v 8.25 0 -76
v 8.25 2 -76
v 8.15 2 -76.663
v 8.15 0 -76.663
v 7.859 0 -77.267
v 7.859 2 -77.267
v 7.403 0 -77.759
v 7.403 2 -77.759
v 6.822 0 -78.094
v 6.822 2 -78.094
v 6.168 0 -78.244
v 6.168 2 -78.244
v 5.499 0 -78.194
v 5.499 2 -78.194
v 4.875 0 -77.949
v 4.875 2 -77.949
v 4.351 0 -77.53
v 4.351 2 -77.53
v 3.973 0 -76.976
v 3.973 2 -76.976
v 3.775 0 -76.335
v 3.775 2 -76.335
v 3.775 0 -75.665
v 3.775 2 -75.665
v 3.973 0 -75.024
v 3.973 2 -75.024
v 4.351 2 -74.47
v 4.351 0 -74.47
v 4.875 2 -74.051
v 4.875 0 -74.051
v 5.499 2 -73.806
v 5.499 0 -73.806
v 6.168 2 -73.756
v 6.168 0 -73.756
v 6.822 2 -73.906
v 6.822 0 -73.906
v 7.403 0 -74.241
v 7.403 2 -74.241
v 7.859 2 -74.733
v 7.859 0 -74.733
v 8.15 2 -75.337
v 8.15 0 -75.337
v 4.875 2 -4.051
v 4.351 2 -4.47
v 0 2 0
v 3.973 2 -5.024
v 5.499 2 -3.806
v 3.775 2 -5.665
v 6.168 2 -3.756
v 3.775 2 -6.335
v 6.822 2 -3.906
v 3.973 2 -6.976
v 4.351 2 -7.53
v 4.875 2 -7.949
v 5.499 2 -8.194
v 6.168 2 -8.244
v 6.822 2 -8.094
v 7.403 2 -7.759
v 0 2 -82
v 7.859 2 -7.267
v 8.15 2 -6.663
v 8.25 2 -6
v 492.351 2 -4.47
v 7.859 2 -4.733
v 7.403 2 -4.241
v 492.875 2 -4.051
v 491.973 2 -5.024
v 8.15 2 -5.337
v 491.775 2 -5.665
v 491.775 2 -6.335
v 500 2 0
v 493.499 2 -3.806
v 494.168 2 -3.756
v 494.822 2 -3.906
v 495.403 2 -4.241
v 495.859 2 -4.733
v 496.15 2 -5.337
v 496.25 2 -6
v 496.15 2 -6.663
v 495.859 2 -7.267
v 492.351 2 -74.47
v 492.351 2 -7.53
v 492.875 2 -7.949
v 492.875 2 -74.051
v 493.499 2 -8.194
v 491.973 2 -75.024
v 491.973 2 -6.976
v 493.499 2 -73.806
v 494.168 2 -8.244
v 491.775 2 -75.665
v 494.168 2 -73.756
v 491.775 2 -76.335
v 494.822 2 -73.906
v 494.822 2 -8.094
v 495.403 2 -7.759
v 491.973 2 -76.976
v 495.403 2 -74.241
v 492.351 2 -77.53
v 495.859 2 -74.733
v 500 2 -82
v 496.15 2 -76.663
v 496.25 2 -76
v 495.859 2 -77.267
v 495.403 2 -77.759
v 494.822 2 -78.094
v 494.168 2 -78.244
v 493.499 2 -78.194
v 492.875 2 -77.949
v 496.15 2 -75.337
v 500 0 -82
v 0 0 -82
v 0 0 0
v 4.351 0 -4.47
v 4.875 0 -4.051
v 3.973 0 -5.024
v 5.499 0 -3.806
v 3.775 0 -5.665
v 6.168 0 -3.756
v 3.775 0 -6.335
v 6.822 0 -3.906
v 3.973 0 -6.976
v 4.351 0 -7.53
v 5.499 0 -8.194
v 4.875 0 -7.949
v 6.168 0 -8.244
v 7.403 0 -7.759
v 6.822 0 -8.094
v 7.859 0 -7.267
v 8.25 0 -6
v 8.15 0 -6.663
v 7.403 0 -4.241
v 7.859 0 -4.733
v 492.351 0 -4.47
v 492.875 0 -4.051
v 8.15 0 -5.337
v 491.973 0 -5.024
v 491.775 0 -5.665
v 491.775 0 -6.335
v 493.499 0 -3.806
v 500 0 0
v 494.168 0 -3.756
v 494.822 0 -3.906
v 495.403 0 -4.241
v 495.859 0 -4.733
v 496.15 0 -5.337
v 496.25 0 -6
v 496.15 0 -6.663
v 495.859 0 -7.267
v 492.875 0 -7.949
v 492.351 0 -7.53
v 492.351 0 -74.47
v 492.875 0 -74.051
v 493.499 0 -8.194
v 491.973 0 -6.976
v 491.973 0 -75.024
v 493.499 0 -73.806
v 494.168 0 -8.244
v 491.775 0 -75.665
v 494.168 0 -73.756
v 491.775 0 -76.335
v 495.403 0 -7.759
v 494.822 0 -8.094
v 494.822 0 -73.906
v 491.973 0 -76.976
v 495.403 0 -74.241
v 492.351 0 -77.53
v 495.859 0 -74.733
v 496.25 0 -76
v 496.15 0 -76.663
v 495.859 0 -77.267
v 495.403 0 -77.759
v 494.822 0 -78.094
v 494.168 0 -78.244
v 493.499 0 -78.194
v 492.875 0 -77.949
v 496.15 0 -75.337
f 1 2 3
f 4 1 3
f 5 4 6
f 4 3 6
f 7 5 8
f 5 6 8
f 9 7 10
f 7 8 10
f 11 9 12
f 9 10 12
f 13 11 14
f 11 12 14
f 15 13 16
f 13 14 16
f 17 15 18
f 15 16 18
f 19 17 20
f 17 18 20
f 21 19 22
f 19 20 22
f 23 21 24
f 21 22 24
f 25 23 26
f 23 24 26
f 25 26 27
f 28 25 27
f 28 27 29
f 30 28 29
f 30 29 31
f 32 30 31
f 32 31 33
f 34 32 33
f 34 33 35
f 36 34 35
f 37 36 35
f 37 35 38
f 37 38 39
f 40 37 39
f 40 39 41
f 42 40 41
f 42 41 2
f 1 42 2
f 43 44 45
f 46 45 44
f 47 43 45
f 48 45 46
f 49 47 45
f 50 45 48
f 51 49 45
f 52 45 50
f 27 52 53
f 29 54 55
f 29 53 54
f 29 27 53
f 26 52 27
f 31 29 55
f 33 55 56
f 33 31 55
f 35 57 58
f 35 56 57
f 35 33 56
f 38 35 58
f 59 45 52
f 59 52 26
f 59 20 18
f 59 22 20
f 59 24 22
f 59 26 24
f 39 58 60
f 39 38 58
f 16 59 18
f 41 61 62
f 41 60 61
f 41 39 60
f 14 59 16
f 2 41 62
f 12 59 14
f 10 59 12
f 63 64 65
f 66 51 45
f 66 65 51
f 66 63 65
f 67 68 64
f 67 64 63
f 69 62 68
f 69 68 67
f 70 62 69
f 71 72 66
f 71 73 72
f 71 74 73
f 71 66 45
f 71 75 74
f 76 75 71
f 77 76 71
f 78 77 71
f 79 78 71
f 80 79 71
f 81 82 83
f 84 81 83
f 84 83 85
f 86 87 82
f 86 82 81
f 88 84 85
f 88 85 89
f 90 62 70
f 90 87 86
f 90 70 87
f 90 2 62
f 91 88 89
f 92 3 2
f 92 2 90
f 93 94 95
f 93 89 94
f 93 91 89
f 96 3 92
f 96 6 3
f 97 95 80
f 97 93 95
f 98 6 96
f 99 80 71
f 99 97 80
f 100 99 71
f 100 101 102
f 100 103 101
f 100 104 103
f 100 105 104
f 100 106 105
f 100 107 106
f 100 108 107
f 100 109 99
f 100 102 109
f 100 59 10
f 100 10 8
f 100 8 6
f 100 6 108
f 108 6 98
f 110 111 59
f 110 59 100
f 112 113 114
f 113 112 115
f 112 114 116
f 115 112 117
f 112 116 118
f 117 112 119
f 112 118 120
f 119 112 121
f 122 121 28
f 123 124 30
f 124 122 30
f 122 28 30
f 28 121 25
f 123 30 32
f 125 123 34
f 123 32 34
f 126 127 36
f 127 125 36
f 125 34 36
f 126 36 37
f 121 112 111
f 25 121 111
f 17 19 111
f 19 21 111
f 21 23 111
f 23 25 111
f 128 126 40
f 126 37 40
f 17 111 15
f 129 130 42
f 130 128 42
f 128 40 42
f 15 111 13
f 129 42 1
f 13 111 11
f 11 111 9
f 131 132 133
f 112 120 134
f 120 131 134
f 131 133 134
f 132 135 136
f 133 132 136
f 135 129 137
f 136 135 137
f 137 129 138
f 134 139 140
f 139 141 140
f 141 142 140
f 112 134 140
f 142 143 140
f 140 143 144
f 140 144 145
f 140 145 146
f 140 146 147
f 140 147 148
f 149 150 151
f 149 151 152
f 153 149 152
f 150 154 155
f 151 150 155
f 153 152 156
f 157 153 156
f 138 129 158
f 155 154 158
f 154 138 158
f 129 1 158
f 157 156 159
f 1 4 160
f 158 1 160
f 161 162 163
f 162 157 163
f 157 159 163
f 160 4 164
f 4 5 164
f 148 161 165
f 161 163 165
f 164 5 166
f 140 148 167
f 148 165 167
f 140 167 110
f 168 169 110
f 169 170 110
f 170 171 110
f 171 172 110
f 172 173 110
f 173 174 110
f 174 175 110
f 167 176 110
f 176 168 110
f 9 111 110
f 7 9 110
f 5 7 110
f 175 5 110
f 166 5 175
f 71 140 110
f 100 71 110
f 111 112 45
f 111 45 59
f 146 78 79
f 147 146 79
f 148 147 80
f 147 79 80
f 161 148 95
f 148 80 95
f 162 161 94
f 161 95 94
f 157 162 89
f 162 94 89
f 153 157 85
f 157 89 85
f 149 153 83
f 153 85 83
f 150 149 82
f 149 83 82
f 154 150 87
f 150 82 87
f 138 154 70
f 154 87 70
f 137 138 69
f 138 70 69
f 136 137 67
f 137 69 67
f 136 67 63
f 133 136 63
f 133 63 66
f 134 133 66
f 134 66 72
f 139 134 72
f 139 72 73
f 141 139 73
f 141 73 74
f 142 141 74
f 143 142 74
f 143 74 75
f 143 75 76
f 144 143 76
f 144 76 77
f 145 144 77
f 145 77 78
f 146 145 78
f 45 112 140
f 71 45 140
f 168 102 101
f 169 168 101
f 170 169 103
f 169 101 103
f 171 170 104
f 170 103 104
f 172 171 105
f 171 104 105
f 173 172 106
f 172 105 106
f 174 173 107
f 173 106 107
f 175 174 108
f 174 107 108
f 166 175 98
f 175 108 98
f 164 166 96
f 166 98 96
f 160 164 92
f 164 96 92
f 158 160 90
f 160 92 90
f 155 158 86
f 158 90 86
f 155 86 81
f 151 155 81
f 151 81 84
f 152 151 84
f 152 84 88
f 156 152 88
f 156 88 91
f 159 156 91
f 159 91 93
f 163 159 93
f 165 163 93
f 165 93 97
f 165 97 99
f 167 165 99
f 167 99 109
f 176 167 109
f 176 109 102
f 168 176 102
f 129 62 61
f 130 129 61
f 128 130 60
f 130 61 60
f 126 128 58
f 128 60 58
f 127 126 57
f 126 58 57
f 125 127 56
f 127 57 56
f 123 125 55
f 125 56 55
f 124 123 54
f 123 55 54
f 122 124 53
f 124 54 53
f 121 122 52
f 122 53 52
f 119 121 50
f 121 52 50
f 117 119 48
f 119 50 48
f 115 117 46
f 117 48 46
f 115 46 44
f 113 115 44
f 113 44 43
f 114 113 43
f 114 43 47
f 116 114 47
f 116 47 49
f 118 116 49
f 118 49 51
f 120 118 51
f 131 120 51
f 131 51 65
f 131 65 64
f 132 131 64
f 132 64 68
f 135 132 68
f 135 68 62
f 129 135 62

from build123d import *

# Parameters (mm, degrees)
SKETCH1_W                = 500
SKETCH1_H                = 82
BOSS_EXTRUDE1_DEPTH      = 2
M4_CLEARANCE_HOLE1_D     = 4.5
M4_CLEARANCE_HOLE1_DEPTH = 2


with BuildPart() as part:
    # Sketch1 → Boss-Extrude1 (new body)
    with BuildSketch(Plane(origin=(0, 0, 0), x_dir=(1, 0, 0), z_dir=(0, 1, 0))):
        with Locations((250, 41)):
            Rectangle(SKETCH1_W, SKETCH1_H)
    extrude(amount=BOSS_EXTRUDE1_DEPTH)

    # M4 Clearance Hole1
    with Locations(Plane(origin=(0, 0, 0), x_dir=(-1, 0, 0), z_dir=(0, -1, 0))):
        with Locations((-6, 6), (-6, 76), (-494, 76), (-494, 6)):
            Hole(M4_CLEARANCE_HOLE1_D / 2, depth=M4_CLEARANCE_HOLE1_DEPTH)


solid = part.part
